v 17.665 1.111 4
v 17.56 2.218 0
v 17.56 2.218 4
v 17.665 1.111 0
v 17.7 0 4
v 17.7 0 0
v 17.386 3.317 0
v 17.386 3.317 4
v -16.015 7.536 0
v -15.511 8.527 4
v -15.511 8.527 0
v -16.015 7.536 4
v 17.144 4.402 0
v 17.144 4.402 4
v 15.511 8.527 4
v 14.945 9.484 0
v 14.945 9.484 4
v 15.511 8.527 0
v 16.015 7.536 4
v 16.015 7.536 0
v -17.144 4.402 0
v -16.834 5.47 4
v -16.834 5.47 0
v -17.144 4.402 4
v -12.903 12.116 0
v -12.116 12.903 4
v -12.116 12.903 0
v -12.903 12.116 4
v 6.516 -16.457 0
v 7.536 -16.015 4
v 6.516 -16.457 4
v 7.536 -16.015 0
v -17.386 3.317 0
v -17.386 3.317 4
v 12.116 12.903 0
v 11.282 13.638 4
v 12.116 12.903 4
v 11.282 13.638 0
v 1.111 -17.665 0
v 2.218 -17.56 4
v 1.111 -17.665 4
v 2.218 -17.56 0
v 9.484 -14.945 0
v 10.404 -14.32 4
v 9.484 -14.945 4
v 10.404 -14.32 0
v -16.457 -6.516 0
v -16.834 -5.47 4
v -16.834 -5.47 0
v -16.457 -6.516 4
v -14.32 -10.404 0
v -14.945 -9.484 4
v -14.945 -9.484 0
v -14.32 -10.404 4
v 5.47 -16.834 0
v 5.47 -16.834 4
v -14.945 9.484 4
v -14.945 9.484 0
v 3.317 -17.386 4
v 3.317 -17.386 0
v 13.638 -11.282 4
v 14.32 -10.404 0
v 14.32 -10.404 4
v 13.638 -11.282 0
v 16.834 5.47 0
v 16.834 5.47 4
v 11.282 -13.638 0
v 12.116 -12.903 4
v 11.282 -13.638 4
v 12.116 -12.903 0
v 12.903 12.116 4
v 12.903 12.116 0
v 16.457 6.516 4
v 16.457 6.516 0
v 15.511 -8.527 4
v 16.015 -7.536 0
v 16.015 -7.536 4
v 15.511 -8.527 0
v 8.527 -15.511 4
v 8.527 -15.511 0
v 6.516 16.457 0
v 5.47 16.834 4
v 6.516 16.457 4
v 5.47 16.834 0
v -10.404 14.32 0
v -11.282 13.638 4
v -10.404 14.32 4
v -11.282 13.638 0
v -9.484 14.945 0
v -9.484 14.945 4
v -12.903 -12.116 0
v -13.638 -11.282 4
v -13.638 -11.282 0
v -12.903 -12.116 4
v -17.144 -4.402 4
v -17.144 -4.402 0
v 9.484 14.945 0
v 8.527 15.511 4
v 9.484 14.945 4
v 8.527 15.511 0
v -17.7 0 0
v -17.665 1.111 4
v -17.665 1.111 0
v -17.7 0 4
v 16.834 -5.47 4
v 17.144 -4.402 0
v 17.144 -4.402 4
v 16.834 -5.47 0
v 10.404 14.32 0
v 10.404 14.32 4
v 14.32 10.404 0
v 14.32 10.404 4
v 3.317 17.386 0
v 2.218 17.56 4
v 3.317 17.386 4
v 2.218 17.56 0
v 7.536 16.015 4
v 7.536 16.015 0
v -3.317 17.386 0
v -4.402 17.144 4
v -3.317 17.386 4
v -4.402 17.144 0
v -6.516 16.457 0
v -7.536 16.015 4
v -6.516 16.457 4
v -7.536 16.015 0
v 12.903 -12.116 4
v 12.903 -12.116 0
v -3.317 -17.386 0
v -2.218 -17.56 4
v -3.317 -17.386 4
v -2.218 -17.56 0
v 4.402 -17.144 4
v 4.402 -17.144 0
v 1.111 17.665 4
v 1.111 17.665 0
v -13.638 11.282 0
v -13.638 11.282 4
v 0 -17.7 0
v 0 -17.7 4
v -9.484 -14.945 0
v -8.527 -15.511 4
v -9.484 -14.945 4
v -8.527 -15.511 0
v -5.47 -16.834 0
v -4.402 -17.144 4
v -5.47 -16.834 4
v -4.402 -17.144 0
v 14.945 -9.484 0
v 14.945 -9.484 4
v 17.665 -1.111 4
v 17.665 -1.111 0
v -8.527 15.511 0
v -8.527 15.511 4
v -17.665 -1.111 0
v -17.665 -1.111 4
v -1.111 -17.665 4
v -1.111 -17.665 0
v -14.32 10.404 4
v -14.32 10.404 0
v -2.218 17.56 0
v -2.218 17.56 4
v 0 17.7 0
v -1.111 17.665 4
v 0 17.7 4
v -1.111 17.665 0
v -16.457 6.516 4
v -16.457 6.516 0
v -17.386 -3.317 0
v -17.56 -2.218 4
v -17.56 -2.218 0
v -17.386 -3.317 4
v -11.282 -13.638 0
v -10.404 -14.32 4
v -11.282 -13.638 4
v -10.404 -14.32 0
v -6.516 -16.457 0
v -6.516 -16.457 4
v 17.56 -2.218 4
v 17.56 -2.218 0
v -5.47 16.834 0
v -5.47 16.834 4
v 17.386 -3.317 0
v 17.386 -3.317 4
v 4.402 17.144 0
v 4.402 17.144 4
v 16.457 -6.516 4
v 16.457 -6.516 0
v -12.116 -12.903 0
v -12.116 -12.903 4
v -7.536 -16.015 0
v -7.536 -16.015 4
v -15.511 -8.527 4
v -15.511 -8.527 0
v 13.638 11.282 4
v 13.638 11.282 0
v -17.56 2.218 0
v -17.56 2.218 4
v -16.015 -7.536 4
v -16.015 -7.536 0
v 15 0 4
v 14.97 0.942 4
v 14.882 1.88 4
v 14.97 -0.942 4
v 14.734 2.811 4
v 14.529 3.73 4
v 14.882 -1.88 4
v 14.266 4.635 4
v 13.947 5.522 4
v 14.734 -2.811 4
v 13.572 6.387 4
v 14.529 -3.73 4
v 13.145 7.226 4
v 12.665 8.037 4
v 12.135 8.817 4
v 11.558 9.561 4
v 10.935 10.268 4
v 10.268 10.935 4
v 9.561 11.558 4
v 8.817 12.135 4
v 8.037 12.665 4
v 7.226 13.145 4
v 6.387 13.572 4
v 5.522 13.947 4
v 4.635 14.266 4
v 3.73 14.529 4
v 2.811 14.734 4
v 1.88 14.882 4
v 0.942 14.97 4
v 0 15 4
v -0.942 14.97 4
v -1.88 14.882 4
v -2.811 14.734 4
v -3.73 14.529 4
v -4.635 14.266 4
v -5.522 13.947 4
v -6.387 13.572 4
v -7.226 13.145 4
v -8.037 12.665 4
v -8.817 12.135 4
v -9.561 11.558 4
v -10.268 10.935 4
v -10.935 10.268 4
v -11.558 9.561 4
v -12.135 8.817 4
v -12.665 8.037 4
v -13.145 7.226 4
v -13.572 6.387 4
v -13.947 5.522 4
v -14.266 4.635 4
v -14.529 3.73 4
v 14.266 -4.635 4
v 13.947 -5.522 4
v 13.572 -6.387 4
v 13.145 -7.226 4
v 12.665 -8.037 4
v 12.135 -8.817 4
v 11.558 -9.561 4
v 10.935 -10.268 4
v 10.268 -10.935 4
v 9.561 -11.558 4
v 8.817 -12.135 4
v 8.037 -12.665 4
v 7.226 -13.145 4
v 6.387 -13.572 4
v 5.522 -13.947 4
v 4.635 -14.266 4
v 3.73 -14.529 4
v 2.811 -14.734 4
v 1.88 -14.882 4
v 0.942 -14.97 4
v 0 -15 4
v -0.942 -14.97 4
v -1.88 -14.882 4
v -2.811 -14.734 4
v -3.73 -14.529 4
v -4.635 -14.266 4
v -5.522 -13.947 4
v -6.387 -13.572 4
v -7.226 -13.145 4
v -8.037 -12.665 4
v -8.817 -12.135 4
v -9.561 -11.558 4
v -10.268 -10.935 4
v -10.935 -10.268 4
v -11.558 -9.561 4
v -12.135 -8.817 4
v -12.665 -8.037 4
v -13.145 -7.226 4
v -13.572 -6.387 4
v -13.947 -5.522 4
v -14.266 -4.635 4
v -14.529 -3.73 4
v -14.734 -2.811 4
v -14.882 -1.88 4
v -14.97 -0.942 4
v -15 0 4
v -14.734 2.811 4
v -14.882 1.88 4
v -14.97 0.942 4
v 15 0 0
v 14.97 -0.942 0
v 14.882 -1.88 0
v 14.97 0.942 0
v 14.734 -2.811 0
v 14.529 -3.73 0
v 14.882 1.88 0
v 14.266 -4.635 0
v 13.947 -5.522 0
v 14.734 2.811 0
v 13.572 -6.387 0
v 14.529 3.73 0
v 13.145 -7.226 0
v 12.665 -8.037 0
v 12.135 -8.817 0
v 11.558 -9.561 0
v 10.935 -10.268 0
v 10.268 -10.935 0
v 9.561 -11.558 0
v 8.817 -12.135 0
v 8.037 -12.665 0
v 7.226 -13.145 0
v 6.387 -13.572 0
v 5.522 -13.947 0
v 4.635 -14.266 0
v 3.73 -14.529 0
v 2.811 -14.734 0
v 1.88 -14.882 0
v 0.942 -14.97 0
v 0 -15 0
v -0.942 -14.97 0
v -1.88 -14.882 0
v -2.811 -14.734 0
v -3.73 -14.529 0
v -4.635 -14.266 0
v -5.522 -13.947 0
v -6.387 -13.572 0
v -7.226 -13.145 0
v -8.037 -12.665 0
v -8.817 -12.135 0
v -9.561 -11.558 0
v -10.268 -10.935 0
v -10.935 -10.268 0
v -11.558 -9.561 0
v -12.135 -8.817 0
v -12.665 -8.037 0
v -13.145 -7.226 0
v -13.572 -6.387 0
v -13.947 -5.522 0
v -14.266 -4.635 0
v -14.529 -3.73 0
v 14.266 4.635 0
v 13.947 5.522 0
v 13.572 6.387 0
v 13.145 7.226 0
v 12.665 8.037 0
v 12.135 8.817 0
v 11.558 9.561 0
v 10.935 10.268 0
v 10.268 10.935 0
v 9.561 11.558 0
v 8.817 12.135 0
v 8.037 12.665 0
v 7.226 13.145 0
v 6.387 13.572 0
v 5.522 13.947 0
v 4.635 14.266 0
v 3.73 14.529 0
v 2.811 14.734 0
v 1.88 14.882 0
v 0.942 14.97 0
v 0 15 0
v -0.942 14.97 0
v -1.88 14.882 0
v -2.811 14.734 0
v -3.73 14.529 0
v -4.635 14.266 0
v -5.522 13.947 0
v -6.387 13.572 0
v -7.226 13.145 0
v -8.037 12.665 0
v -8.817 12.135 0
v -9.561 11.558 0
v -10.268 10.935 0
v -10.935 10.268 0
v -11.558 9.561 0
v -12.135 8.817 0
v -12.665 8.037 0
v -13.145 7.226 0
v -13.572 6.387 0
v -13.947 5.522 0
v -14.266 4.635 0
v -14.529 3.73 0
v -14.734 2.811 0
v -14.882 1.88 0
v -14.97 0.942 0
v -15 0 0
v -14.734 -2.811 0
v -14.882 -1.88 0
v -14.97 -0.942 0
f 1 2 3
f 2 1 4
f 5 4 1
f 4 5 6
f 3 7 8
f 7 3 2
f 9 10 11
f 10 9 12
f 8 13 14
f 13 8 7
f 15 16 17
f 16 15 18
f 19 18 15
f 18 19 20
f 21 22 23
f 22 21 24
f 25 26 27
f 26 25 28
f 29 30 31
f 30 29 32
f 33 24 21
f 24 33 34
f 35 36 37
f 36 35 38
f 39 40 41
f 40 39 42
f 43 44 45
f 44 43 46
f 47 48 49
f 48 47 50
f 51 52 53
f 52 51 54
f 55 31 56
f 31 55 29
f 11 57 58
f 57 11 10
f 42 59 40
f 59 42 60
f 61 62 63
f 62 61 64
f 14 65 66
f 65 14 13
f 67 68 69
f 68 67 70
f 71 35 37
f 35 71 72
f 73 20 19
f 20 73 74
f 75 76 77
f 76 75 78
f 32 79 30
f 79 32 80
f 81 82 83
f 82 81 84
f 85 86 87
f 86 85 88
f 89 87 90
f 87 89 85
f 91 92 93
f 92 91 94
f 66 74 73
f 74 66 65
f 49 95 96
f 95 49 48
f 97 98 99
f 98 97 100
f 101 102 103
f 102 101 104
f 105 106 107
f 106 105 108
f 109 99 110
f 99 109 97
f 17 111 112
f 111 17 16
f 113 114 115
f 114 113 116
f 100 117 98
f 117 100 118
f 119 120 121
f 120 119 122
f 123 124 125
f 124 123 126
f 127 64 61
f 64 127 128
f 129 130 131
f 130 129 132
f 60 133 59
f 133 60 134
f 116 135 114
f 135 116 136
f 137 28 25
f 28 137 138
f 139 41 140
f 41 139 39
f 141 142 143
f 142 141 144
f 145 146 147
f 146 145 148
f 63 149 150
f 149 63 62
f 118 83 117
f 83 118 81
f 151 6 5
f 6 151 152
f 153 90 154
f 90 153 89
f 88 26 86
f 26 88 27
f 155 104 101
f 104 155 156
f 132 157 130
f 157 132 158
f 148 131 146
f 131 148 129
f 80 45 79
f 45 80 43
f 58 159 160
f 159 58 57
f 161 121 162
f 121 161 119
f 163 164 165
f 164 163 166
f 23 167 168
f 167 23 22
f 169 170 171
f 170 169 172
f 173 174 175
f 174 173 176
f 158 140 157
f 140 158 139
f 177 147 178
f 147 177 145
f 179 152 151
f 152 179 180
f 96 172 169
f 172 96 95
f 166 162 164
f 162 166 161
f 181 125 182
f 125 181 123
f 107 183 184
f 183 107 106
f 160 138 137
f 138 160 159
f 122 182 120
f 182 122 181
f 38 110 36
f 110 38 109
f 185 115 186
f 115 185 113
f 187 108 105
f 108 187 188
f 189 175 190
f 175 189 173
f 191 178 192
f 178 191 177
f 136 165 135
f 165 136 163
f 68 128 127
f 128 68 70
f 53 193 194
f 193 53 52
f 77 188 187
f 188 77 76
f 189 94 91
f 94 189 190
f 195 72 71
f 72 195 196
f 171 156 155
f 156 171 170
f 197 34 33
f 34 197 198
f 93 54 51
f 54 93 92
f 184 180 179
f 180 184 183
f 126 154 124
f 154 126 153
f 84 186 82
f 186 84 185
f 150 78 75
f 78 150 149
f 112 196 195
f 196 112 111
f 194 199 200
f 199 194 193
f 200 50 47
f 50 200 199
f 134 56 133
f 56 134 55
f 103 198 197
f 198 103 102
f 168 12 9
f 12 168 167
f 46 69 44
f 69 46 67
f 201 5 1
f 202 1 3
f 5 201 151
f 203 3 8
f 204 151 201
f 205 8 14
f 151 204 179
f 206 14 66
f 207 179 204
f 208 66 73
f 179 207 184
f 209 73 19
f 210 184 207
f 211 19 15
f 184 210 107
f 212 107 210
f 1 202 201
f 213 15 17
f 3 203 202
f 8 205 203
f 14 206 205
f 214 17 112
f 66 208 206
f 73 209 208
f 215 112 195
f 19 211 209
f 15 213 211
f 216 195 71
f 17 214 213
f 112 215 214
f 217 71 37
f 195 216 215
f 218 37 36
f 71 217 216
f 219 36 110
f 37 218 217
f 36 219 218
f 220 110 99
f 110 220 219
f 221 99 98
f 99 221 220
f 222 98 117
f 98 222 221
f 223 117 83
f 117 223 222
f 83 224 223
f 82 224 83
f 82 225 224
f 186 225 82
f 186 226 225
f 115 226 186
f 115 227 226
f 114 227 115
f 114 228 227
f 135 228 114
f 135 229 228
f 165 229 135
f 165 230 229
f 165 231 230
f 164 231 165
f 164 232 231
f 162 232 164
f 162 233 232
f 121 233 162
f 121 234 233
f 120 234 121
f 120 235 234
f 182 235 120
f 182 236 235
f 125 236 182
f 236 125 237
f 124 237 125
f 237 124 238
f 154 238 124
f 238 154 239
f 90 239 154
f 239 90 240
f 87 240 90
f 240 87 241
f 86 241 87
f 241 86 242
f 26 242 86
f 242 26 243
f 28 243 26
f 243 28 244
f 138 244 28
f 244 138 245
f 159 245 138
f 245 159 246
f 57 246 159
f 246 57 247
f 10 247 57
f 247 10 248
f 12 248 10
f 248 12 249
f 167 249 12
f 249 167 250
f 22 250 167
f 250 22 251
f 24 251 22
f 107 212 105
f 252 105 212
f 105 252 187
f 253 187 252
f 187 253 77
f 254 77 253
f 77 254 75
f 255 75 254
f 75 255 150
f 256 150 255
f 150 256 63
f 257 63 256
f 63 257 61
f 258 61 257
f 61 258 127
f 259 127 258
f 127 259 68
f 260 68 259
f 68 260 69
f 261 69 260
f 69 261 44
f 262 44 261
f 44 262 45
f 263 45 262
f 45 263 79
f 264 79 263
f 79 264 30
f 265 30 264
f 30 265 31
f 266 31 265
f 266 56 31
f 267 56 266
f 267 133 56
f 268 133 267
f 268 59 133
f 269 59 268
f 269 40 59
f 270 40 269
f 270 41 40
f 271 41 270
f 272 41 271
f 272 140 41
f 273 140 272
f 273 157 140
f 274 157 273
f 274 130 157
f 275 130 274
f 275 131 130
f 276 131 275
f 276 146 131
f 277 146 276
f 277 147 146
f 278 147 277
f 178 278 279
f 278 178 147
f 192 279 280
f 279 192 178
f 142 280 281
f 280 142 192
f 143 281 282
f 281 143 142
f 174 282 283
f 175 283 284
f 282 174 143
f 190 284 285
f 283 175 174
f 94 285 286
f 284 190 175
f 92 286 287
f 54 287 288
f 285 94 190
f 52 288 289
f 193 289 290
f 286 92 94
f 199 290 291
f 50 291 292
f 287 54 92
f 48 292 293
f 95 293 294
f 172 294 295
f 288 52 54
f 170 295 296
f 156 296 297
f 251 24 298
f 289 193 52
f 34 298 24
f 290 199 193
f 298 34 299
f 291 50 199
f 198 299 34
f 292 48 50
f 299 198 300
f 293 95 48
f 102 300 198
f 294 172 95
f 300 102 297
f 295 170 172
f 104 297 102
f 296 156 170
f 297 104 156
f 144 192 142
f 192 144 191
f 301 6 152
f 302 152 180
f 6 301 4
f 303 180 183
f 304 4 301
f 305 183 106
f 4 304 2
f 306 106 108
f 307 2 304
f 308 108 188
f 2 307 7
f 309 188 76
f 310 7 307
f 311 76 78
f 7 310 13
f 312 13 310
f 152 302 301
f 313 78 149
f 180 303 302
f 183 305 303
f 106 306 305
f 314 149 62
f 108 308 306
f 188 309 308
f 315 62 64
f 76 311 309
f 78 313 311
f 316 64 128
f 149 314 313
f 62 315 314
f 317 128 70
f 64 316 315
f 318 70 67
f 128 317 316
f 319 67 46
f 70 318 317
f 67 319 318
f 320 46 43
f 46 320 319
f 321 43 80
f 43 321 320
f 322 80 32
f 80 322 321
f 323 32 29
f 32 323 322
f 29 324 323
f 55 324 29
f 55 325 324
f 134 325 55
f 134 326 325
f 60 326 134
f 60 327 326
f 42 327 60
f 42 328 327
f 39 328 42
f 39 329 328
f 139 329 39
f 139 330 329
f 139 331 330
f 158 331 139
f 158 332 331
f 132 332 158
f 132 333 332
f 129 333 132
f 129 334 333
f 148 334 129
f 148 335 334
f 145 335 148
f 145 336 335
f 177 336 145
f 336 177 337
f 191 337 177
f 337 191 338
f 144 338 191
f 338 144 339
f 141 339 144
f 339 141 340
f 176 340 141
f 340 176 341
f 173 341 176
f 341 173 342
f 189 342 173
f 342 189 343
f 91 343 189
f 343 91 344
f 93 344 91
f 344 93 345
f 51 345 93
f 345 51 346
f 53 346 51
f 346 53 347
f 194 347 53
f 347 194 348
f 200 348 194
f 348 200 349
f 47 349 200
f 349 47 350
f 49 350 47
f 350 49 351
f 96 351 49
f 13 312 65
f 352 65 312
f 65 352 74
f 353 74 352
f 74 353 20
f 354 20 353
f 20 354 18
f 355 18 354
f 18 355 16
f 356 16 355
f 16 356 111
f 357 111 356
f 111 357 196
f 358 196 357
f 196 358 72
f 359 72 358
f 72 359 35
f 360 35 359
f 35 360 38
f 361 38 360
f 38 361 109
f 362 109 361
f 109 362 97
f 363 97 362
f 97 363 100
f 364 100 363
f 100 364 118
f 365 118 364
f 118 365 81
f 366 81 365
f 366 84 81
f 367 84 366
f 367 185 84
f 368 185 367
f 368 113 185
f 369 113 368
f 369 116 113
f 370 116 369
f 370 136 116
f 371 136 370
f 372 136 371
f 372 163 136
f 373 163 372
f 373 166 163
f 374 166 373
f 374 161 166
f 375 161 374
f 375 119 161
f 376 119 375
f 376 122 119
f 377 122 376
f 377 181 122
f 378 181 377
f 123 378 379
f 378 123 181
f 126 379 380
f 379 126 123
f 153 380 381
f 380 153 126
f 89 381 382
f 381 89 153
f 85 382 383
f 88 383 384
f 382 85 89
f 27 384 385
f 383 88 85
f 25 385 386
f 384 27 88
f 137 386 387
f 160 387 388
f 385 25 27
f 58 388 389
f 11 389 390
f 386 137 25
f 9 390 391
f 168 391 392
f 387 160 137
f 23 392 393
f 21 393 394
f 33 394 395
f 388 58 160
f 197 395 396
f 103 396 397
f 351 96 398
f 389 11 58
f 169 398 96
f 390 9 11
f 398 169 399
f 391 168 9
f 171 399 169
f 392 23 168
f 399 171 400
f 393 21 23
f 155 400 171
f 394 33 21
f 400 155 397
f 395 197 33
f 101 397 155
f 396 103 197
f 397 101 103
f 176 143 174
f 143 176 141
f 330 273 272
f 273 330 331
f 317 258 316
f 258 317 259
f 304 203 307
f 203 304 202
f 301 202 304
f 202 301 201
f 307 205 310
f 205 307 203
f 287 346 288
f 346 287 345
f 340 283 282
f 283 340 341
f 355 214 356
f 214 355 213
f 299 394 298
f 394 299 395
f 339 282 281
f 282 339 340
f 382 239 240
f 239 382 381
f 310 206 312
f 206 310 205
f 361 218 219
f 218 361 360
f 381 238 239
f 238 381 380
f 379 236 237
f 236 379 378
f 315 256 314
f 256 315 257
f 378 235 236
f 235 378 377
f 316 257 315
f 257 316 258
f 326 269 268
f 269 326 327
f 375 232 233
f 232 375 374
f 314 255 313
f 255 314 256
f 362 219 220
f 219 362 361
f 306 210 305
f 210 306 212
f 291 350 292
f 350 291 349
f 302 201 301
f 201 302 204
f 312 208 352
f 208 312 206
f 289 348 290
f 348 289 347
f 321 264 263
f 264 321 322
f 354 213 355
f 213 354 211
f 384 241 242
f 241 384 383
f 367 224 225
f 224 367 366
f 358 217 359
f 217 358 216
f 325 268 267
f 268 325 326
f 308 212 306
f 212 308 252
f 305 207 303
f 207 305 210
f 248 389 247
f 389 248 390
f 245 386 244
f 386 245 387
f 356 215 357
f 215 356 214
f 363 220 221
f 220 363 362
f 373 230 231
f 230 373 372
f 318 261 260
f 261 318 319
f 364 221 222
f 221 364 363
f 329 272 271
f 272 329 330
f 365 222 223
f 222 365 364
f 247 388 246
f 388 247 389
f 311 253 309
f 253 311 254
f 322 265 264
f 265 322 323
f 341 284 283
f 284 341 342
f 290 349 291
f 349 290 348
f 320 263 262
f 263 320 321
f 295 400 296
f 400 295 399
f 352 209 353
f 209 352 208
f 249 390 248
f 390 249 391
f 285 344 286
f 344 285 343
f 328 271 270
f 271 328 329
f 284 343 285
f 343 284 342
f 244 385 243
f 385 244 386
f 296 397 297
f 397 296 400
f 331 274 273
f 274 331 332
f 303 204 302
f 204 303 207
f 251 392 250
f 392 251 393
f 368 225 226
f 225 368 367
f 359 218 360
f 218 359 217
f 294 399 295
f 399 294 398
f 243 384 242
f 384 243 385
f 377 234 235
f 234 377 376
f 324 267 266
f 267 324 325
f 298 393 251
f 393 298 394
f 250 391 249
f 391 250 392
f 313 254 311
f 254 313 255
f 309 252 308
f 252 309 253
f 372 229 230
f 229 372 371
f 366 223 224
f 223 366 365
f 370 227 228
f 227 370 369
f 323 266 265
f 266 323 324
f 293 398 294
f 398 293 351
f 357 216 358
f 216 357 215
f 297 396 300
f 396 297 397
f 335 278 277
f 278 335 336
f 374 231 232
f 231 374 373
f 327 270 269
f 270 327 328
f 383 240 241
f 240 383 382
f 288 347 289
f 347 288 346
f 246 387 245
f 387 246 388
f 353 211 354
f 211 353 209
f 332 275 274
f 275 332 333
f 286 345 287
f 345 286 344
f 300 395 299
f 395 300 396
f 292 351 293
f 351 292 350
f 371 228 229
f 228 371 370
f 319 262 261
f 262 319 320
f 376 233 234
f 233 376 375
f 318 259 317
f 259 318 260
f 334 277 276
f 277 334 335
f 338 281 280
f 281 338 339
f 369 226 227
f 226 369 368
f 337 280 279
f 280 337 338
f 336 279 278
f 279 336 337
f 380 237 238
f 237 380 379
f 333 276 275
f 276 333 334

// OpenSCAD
$fn=100;
difference() {
cylinder(h=4, d=35.4);
cylinder(h=4, d=30);
}
